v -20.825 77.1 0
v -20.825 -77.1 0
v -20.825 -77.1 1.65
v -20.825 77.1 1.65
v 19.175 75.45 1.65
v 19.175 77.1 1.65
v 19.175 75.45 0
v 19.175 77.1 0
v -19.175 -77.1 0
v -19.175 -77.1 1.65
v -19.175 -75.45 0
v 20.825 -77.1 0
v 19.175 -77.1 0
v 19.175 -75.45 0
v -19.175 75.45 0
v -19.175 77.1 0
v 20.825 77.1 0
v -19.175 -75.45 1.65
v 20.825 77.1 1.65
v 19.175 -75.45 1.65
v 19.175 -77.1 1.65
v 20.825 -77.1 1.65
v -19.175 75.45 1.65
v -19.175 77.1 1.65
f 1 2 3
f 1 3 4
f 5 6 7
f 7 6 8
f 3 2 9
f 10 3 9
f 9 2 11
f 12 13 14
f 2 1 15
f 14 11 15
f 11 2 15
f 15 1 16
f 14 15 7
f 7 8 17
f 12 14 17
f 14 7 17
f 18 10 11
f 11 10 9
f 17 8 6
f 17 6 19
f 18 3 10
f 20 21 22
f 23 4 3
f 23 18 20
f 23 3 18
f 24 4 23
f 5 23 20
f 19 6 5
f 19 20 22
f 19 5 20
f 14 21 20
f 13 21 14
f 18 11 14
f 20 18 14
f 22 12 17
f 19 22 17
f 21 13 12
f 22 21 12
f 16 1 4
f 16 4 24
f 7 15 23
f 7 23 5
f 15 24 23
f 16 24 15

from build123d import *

# Parameters (mm, degrees)
SKETCH1_W           = 41.65
SKETCH1_H           = 154.2
BOSS_EXTRUDE1_DEPTH = 1.65
SKETCH3_W           = 38.35
SKETCH3_H           = 1.65
CUT_EXTRUDE1_DEPTH  = 1.65


with BuildPart() as part:
    # Sketch1 → Boss-Extrude1 (new body)
    with BuildSketch(Plane.XY):
        Rectangle(SKETCH1_W, SKETCH1_H)
    extrude(amount=BOSS_EXTRUDE1_DEPTH)

    # Sketch3 → Cut-Extrude1 (cut)
    with BuildSketch(Plane(origin=(0, 77.1, 0), x_dir=(1, 0, 0), z_dir=(0, 1, 0))):
        with Locations((0, -0.825)):
            Rectangle(SKETCH3_W, SKETCH3_H)
    cut_extrude1 = extrude(amount=-CUT_EXTRUDE1_DEPTH, mode=Mode.SUBTRACT)

    # Mirror1: Cut-Extrude1 across plane
    add(cut_extrude1.mirror(Plane.ZX), mode=Mode.SUBTRACT)


solid = part.part
